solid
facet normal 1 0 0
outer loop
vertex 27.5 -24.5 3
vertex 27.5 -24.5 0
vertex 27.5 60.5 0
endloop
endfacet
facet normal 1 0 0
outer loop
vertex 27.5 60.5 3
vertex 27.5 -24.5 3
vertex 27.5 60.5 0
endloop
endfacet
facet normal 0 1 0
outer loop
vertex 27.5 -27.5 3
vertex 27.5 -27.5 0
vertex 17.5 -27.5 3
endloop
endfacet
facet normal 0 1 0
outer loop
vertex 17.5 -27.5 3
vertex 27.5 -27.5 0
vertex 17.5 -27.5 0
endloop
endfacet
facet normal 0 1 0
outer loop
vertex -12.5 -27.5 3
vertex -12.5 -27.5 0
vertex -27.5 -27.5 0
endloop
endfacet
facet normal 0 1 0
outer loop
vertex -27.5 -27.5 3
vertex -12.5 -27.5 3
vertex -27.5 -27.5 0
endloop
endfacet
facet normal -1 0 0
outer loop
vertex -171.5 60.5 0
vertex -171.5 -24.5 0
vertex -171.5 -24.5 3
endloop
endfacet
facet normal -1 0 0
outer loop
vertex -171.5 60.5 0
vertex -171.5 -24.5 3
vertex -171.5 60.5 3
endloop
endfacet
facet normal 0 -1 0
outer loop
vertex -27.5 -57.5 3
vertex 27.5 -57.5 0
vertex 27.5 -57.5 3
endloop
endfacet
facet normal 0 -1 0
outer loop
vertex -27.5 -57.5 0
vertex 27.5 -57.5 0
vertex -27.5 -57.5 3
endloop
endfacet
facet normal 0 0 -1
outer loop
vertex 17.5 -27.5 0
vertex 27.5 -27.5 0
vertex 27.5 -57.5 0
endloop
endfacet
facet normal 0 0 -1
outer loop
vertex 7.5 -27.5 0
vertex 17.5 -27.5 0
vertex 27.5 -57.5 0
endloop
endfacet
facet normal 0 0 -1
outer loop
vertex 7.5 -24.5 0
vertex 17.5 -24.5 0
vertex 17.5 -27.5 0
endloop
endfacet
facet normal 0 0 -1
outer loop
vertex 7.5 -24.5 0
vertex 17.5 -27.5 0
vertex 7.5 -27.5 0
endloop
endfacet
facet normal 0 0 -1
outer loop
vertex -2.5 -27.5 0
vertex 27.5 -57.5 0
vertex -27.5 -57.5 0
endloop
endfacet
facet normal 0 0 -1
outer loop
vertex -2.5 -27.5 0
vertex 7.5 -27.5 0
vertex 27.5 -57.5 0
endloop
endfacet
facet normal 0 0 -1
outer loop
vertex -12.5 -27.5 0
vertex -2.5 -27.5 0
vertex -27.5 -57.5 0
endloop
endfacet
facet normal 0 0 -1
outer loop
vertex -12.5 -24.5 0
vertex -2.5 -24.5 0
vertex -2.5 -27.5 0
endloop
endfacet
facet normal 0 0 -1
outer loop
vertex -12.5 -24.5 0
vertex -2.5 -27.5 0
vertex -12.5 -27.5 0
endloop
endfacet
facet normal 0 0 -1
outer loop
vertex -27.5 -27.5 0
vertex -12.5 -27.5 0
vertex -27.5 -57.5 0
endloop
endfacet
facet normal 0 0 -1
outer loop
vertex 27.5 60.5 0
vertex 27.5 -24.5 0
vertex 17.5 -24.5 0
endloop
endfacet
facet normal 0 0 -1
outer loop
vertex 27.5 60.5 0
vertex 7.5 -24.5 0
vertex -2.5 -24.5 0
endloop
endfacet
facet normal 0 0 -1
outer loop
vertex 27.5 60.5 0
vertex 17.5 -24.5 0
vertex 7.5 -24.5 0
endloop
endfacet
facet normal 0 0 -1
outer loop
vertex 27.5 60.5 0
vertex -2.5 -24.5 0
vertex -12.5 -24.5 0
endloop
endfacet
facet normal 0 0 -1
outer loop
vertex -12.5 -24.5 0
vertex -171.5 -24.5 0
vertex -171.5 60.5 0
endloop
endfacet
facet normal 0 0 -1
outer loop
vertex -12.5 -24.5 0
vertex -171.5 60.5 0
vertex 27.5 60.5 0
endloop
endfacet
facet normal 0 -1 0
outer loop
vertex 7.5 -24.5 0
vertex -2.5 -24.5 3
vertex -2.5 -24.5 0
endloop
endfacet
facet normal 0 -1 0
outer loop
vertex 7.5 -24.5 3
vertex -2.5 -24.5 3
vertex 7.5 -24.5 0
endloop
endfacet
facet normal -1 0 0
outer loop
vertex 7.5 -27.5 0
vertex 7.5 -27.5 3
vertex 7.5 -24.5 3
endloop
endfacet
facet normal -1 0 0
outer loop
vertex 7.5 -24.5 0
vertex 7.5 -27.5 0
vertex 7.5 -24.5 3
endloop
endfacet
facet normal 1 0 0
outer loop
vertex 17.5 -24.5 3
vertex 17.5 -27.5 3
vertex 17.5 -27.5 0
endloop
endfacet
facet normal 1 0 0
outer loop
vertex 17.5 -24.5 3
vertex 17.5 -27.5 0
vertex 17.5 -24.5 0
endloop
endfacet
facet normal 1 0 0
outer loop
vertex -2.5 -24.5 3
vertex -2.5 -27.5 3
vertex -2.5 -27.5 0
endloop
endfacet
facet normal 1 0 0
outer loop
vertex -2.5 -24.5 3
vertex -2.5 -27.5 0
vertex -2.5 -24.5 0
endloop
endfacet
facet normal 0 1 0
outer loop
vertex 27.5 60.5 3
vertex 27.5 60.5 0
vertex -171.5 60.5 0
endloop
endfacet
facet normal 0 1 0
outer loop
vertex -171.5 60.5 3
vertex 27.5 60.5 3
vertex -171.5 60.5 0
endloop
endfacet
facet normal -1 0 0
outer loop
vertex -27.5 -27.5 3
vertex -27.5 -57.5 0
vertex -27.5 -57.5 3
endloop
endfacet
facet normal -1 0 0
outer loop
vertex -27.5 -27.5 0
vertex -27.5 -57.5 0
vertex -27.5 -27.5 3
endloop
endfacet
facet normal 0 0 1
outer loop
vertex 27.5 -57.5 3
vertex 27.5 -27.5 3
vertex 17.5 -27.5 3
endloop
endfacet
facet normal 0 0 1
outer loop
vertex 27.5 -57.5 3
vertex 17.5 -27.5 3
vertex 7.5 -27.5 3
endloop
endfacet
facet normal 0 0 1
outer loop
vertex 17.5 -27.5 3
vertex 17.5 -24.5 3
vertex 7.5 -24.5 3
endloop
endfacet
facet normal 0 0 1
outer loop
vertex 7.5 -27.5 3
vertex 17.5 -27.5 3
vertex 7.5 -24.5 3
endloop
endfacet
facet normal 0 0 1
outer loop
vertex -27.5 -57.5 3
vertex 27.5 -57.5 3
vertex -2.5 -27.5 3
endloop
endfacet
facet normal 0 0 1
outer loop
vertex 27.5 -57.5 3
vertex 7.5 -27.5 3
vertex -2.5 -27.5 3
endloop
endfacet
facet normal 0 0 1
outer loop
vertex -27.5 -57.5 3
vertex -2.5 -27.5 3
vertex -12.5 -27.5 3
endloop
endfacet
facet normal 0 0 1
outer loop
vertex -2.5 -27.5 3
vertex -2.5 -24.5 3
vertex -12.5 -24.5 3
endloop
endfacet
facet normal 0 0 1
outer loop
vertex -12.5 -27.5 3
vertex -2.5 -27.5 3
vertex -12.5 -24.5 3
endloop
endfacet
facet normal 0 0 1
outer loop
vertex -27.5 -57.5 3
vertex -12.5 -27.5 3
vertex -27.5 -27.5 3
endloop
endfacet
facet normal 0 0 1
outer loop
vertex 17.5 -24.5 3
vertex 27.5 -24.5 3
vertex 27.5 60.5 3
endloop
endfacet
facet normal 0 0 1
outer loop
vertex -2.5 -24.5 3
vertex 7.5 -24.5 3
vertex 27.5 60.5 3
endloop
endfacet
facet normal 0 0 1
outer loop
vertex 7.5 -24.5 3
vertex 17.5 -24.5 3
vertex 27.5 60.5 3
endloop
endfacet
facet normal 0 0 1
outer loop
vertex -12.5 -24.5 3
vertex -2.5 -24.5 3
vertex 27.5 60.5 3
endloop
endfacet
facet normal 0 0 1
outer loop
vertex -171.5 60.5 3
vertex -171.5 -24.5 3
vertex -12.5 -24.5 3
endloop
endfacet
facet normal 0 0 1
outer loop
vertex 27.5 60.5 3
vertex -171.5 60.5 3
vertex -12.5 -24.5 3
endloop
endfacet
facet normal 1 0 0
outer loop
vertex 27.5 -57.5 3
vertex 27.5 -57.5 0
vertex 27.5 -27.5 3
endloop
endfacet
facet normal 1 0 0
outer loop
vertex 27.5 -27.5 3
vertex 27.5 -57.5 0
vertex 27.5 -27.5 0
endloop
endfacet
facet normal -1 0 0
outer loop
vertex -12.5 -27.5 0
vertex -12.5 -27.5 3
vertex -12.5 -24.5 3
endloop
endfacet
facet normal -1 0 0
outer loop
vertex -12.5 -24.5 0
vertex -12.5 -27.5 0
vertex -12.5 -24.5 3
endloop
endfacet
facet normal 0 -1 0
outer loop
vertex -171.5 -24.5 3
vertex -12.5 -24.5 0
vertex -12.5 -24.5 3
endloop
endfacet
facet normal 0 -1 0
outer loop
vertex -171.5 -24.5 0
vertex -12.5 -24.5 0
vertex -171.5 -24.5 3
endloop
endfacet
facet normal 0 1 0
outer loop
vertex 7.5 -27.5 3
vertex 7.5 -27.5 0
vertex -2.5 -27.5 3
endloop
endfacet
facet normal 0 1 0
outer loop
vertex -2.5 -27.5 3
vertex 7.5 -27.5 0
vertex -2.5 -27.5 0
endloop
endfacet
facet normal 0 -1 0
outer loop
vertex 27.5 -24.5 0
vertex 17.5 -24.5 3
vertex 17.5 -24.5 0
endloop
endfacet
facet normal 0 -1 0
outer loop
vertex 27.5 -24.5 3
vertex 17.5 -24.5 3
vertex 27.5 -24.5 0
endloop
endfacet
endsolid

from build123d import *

# Parameters (mm, degrees)
SKETCH1_W           = 55
SKETCH1_H           = 55
BOSS_EXTRUDE1_DEPTH = 3
SKETCH2_W           = 10
SKETCH2_H           = 3
SKETCH2_W_2         = 15
CUT_EXTRUDE1_DEPTH  = 3
SKETCH3_W           = 55
SKETCH3_H           = 30
BOSS_EXTRUDE2_DEPTH = 3
SKETCH4_W           = 144
SKETCH4_H           = 52
BOSS_EXTRUDE3_DEPTH = 3
SKETCH5_W           = 199
SKETCH5_H           = 13
BOSS_EXTRUDE4_DEPTH = 3
SKETCH6_W           = 199
SKETCH6_H           = 20
BOSS_EXTRUDE5_DEPTH = 3
SKETCH7_R           = 2
SKETCH7_W           = 40
SKETCH7_H           = 20
CUT_EXTRUDE22_DEPTH = 33
SKETCH8_W           = 40
SKETCH8_H           = 9
CUT_EXTRUDE23_DEPTH = 33
SKETCH9_W           = 63.816090929
SKETCH9_H           = 30.906314682
BOSS_EXTRUDE6_DEPTH = 3


with BuildPart() as part:
    # Sketch1 → Boss-Extrude1 (new body)
    with BuildSketch(Plane.XY):
        Rectangle(SKETCH1_W, SKETCH1_H)
    extrude(amount=BOSS_EXTRUDE1_DEPTH)

    # Sketch2 → Cut-Extrude1 (cut)
    with BuildSketch(Plane.XY.offset(3)):
        with Locations((22.5, -26)):
            Rectangle(SKETCH2_W, SKETCH2_H)
        with Locations((2.5, -26)):
            Rectangle(SKETCH2_W, SKETCH2_H)
        with Locations((-20, -26)):
            Rectangle(SKETCH2_W_2, SKETCH2_H)
    extrude(amount=-CUT_EXTRUDE1_DEPTH, mode=Mode.SUBTRACT)

    # Sketch3 → Boss-Extrude2 (add)
    with BuildSketch(Plane(origin=(0, 0, 0), x_dir=(-1, 0, 0), z_dir=(0, 0, -1))):
        with Locations((0, -42.5)):
            Rectangle(SKETCH3_W, SKETCH3_H)
    extrude(amount=-BOSS_EXTRUDE2_DEPTH)

    # Sketch4 → Boss-Extrude3 (add)
    with BuildSketch(Plane(origin=(0, 0, 0), x_dir=(-1, 0, 0), z_dir=(0, 0, -1))):
        with Locations((99.5, 1.5)):
            Rectangle(SKETCH4_W, SKETCH4_H)
    extrude(amount=-BOSS_EXTRUDE3_DEPTH)

    # Sketch5 → Boss-Extrude4 (add)
    with BuildSketch(Plane(origin=(0, 0, 0), x_dir=(-1, 0, 0), z_dir=(0, 0, -1))):
        with Locations((72, 34)):
            Rectangle(SKETCH5_W, SKETCH5_H)
    extrude(amount=-BOSS_EXTRUDE4_DEPTH)

    # Sketch6 → Boss-Extrude5 (add)
    with BuildSketch(Plane(origin=(0, 0, 0), x_dir=(-1, 0, 0), z_dir=(0, 0, -1))):
        with Locations((72, 50.5)):
            Rectangle(SKETCH6_W, SKETCH6_H)
    extrude(amount=-BOSS_EXTRUDE5_DEPTH)

    # Sketch7 → Cut-Extrude22 (cut)
    with BuildSketch(Plane(origin=(0, 0, 0), x_dir=(-1, 0, 0), z_dir=(0, 0, -1))):
        with Locations((168.5, 46.5)):
            Circle(SKETCH7_R)
        with Locations((168.5, 36.5)):
            Circle(SKETCH7_R)
        with Locations((118.5, 36.5)):
            Circle(SKETCH7_R)
        with Locations((118.5, 46.5)):
            Circle(SKETCH7_R)
        with Locations((143.5, 41.5)):
            Rectangle(SKETCH7_W, SKETCH7_H)
    extrude(amount=-CUT_EXTRUDE22_DEPTH, mode=Mode.SUBTRACT)

    # Sketch8 → Cut-Extrude23 (cut)
    with BuildSketch(Plane(origin=(0, 0, 0), x_dir=(-1, 0, 0), z_dir=(0, 0, -1))):
        with Locations((143.5, 56)):
            Rectangle(SKETCH8_W, SKETCH8_H)
    extrude(amount=-CUT_EXTRUDE23_DEPTH, mode=Mode.SUBTRACT)

    # Sketch9 → Boss-Extrude6 (add)
    with BuildSketch(Plane(origin=(0, 0, 0), x_dir=(-1, 0, 0), z_dir=(0, 0, -1))):
        with Locations((139.591954536, 45.046842659)):
            Rectangle(SKETCH9_W, SKETCH9_H)
    extrude(amount=-BOSS_EXTRUDE6_DEPTH)


solid = part.part
